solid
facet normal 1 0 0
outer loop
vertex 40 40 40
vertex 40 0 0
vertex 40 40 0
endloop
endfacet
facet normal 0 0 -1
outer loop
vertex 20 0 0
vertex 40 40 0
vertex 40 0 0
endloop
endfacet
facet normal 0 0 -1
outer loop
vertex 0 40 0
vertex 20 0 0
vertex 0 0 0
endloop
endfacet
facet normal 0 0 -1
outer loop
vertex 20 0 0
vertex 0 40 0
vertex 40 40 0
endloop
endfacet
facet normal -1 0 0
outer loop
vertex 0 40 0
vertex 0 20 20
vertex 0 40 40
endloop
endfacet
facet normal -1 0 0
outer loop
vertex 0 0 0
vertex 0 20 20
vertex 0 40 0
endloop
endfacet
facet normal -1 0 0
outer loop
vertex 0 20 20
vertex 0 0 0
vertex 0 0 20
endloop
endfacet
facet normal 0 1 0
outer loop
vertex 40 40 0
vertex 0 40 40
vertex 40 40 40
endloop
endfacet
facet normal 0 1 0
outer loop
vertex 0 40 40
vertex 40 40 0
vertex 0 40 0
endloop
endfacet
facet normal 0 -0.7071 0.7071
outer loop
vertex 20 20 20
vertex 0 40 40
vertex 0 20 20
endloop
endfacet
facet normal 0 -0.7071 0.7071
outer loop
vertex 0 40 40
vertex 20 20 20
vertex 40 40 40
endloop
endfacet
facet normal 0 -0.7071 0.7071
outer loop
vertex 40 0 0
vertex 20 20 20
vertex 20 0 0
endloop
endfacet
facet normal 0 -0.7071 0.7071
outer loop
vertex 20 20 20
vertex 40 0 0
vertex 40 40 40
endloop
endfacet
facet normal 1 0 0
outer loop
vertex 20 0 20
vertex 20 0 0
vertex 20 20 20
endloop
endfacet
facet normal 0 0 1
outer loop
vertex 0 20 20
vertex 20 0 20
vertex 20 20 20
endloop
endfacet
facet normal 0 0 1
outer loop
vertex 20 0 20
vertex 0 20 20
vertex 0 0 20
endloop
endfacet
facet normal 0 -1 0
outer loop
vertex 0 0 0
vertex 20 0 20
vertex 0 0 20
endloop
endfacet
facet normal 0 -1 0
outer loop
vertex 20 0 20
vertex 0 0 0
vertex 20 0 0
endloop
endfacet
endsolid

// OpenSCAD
union(){
  difference(){
    cube([40, 40, 40], center=false);
    color([1,0.8,0]) {
      rotate([45, 0, 0]){
        cube([40, 60, 40], center=false);
      }
    }
  }
  cube([20, 20, 20], center=false);
}
